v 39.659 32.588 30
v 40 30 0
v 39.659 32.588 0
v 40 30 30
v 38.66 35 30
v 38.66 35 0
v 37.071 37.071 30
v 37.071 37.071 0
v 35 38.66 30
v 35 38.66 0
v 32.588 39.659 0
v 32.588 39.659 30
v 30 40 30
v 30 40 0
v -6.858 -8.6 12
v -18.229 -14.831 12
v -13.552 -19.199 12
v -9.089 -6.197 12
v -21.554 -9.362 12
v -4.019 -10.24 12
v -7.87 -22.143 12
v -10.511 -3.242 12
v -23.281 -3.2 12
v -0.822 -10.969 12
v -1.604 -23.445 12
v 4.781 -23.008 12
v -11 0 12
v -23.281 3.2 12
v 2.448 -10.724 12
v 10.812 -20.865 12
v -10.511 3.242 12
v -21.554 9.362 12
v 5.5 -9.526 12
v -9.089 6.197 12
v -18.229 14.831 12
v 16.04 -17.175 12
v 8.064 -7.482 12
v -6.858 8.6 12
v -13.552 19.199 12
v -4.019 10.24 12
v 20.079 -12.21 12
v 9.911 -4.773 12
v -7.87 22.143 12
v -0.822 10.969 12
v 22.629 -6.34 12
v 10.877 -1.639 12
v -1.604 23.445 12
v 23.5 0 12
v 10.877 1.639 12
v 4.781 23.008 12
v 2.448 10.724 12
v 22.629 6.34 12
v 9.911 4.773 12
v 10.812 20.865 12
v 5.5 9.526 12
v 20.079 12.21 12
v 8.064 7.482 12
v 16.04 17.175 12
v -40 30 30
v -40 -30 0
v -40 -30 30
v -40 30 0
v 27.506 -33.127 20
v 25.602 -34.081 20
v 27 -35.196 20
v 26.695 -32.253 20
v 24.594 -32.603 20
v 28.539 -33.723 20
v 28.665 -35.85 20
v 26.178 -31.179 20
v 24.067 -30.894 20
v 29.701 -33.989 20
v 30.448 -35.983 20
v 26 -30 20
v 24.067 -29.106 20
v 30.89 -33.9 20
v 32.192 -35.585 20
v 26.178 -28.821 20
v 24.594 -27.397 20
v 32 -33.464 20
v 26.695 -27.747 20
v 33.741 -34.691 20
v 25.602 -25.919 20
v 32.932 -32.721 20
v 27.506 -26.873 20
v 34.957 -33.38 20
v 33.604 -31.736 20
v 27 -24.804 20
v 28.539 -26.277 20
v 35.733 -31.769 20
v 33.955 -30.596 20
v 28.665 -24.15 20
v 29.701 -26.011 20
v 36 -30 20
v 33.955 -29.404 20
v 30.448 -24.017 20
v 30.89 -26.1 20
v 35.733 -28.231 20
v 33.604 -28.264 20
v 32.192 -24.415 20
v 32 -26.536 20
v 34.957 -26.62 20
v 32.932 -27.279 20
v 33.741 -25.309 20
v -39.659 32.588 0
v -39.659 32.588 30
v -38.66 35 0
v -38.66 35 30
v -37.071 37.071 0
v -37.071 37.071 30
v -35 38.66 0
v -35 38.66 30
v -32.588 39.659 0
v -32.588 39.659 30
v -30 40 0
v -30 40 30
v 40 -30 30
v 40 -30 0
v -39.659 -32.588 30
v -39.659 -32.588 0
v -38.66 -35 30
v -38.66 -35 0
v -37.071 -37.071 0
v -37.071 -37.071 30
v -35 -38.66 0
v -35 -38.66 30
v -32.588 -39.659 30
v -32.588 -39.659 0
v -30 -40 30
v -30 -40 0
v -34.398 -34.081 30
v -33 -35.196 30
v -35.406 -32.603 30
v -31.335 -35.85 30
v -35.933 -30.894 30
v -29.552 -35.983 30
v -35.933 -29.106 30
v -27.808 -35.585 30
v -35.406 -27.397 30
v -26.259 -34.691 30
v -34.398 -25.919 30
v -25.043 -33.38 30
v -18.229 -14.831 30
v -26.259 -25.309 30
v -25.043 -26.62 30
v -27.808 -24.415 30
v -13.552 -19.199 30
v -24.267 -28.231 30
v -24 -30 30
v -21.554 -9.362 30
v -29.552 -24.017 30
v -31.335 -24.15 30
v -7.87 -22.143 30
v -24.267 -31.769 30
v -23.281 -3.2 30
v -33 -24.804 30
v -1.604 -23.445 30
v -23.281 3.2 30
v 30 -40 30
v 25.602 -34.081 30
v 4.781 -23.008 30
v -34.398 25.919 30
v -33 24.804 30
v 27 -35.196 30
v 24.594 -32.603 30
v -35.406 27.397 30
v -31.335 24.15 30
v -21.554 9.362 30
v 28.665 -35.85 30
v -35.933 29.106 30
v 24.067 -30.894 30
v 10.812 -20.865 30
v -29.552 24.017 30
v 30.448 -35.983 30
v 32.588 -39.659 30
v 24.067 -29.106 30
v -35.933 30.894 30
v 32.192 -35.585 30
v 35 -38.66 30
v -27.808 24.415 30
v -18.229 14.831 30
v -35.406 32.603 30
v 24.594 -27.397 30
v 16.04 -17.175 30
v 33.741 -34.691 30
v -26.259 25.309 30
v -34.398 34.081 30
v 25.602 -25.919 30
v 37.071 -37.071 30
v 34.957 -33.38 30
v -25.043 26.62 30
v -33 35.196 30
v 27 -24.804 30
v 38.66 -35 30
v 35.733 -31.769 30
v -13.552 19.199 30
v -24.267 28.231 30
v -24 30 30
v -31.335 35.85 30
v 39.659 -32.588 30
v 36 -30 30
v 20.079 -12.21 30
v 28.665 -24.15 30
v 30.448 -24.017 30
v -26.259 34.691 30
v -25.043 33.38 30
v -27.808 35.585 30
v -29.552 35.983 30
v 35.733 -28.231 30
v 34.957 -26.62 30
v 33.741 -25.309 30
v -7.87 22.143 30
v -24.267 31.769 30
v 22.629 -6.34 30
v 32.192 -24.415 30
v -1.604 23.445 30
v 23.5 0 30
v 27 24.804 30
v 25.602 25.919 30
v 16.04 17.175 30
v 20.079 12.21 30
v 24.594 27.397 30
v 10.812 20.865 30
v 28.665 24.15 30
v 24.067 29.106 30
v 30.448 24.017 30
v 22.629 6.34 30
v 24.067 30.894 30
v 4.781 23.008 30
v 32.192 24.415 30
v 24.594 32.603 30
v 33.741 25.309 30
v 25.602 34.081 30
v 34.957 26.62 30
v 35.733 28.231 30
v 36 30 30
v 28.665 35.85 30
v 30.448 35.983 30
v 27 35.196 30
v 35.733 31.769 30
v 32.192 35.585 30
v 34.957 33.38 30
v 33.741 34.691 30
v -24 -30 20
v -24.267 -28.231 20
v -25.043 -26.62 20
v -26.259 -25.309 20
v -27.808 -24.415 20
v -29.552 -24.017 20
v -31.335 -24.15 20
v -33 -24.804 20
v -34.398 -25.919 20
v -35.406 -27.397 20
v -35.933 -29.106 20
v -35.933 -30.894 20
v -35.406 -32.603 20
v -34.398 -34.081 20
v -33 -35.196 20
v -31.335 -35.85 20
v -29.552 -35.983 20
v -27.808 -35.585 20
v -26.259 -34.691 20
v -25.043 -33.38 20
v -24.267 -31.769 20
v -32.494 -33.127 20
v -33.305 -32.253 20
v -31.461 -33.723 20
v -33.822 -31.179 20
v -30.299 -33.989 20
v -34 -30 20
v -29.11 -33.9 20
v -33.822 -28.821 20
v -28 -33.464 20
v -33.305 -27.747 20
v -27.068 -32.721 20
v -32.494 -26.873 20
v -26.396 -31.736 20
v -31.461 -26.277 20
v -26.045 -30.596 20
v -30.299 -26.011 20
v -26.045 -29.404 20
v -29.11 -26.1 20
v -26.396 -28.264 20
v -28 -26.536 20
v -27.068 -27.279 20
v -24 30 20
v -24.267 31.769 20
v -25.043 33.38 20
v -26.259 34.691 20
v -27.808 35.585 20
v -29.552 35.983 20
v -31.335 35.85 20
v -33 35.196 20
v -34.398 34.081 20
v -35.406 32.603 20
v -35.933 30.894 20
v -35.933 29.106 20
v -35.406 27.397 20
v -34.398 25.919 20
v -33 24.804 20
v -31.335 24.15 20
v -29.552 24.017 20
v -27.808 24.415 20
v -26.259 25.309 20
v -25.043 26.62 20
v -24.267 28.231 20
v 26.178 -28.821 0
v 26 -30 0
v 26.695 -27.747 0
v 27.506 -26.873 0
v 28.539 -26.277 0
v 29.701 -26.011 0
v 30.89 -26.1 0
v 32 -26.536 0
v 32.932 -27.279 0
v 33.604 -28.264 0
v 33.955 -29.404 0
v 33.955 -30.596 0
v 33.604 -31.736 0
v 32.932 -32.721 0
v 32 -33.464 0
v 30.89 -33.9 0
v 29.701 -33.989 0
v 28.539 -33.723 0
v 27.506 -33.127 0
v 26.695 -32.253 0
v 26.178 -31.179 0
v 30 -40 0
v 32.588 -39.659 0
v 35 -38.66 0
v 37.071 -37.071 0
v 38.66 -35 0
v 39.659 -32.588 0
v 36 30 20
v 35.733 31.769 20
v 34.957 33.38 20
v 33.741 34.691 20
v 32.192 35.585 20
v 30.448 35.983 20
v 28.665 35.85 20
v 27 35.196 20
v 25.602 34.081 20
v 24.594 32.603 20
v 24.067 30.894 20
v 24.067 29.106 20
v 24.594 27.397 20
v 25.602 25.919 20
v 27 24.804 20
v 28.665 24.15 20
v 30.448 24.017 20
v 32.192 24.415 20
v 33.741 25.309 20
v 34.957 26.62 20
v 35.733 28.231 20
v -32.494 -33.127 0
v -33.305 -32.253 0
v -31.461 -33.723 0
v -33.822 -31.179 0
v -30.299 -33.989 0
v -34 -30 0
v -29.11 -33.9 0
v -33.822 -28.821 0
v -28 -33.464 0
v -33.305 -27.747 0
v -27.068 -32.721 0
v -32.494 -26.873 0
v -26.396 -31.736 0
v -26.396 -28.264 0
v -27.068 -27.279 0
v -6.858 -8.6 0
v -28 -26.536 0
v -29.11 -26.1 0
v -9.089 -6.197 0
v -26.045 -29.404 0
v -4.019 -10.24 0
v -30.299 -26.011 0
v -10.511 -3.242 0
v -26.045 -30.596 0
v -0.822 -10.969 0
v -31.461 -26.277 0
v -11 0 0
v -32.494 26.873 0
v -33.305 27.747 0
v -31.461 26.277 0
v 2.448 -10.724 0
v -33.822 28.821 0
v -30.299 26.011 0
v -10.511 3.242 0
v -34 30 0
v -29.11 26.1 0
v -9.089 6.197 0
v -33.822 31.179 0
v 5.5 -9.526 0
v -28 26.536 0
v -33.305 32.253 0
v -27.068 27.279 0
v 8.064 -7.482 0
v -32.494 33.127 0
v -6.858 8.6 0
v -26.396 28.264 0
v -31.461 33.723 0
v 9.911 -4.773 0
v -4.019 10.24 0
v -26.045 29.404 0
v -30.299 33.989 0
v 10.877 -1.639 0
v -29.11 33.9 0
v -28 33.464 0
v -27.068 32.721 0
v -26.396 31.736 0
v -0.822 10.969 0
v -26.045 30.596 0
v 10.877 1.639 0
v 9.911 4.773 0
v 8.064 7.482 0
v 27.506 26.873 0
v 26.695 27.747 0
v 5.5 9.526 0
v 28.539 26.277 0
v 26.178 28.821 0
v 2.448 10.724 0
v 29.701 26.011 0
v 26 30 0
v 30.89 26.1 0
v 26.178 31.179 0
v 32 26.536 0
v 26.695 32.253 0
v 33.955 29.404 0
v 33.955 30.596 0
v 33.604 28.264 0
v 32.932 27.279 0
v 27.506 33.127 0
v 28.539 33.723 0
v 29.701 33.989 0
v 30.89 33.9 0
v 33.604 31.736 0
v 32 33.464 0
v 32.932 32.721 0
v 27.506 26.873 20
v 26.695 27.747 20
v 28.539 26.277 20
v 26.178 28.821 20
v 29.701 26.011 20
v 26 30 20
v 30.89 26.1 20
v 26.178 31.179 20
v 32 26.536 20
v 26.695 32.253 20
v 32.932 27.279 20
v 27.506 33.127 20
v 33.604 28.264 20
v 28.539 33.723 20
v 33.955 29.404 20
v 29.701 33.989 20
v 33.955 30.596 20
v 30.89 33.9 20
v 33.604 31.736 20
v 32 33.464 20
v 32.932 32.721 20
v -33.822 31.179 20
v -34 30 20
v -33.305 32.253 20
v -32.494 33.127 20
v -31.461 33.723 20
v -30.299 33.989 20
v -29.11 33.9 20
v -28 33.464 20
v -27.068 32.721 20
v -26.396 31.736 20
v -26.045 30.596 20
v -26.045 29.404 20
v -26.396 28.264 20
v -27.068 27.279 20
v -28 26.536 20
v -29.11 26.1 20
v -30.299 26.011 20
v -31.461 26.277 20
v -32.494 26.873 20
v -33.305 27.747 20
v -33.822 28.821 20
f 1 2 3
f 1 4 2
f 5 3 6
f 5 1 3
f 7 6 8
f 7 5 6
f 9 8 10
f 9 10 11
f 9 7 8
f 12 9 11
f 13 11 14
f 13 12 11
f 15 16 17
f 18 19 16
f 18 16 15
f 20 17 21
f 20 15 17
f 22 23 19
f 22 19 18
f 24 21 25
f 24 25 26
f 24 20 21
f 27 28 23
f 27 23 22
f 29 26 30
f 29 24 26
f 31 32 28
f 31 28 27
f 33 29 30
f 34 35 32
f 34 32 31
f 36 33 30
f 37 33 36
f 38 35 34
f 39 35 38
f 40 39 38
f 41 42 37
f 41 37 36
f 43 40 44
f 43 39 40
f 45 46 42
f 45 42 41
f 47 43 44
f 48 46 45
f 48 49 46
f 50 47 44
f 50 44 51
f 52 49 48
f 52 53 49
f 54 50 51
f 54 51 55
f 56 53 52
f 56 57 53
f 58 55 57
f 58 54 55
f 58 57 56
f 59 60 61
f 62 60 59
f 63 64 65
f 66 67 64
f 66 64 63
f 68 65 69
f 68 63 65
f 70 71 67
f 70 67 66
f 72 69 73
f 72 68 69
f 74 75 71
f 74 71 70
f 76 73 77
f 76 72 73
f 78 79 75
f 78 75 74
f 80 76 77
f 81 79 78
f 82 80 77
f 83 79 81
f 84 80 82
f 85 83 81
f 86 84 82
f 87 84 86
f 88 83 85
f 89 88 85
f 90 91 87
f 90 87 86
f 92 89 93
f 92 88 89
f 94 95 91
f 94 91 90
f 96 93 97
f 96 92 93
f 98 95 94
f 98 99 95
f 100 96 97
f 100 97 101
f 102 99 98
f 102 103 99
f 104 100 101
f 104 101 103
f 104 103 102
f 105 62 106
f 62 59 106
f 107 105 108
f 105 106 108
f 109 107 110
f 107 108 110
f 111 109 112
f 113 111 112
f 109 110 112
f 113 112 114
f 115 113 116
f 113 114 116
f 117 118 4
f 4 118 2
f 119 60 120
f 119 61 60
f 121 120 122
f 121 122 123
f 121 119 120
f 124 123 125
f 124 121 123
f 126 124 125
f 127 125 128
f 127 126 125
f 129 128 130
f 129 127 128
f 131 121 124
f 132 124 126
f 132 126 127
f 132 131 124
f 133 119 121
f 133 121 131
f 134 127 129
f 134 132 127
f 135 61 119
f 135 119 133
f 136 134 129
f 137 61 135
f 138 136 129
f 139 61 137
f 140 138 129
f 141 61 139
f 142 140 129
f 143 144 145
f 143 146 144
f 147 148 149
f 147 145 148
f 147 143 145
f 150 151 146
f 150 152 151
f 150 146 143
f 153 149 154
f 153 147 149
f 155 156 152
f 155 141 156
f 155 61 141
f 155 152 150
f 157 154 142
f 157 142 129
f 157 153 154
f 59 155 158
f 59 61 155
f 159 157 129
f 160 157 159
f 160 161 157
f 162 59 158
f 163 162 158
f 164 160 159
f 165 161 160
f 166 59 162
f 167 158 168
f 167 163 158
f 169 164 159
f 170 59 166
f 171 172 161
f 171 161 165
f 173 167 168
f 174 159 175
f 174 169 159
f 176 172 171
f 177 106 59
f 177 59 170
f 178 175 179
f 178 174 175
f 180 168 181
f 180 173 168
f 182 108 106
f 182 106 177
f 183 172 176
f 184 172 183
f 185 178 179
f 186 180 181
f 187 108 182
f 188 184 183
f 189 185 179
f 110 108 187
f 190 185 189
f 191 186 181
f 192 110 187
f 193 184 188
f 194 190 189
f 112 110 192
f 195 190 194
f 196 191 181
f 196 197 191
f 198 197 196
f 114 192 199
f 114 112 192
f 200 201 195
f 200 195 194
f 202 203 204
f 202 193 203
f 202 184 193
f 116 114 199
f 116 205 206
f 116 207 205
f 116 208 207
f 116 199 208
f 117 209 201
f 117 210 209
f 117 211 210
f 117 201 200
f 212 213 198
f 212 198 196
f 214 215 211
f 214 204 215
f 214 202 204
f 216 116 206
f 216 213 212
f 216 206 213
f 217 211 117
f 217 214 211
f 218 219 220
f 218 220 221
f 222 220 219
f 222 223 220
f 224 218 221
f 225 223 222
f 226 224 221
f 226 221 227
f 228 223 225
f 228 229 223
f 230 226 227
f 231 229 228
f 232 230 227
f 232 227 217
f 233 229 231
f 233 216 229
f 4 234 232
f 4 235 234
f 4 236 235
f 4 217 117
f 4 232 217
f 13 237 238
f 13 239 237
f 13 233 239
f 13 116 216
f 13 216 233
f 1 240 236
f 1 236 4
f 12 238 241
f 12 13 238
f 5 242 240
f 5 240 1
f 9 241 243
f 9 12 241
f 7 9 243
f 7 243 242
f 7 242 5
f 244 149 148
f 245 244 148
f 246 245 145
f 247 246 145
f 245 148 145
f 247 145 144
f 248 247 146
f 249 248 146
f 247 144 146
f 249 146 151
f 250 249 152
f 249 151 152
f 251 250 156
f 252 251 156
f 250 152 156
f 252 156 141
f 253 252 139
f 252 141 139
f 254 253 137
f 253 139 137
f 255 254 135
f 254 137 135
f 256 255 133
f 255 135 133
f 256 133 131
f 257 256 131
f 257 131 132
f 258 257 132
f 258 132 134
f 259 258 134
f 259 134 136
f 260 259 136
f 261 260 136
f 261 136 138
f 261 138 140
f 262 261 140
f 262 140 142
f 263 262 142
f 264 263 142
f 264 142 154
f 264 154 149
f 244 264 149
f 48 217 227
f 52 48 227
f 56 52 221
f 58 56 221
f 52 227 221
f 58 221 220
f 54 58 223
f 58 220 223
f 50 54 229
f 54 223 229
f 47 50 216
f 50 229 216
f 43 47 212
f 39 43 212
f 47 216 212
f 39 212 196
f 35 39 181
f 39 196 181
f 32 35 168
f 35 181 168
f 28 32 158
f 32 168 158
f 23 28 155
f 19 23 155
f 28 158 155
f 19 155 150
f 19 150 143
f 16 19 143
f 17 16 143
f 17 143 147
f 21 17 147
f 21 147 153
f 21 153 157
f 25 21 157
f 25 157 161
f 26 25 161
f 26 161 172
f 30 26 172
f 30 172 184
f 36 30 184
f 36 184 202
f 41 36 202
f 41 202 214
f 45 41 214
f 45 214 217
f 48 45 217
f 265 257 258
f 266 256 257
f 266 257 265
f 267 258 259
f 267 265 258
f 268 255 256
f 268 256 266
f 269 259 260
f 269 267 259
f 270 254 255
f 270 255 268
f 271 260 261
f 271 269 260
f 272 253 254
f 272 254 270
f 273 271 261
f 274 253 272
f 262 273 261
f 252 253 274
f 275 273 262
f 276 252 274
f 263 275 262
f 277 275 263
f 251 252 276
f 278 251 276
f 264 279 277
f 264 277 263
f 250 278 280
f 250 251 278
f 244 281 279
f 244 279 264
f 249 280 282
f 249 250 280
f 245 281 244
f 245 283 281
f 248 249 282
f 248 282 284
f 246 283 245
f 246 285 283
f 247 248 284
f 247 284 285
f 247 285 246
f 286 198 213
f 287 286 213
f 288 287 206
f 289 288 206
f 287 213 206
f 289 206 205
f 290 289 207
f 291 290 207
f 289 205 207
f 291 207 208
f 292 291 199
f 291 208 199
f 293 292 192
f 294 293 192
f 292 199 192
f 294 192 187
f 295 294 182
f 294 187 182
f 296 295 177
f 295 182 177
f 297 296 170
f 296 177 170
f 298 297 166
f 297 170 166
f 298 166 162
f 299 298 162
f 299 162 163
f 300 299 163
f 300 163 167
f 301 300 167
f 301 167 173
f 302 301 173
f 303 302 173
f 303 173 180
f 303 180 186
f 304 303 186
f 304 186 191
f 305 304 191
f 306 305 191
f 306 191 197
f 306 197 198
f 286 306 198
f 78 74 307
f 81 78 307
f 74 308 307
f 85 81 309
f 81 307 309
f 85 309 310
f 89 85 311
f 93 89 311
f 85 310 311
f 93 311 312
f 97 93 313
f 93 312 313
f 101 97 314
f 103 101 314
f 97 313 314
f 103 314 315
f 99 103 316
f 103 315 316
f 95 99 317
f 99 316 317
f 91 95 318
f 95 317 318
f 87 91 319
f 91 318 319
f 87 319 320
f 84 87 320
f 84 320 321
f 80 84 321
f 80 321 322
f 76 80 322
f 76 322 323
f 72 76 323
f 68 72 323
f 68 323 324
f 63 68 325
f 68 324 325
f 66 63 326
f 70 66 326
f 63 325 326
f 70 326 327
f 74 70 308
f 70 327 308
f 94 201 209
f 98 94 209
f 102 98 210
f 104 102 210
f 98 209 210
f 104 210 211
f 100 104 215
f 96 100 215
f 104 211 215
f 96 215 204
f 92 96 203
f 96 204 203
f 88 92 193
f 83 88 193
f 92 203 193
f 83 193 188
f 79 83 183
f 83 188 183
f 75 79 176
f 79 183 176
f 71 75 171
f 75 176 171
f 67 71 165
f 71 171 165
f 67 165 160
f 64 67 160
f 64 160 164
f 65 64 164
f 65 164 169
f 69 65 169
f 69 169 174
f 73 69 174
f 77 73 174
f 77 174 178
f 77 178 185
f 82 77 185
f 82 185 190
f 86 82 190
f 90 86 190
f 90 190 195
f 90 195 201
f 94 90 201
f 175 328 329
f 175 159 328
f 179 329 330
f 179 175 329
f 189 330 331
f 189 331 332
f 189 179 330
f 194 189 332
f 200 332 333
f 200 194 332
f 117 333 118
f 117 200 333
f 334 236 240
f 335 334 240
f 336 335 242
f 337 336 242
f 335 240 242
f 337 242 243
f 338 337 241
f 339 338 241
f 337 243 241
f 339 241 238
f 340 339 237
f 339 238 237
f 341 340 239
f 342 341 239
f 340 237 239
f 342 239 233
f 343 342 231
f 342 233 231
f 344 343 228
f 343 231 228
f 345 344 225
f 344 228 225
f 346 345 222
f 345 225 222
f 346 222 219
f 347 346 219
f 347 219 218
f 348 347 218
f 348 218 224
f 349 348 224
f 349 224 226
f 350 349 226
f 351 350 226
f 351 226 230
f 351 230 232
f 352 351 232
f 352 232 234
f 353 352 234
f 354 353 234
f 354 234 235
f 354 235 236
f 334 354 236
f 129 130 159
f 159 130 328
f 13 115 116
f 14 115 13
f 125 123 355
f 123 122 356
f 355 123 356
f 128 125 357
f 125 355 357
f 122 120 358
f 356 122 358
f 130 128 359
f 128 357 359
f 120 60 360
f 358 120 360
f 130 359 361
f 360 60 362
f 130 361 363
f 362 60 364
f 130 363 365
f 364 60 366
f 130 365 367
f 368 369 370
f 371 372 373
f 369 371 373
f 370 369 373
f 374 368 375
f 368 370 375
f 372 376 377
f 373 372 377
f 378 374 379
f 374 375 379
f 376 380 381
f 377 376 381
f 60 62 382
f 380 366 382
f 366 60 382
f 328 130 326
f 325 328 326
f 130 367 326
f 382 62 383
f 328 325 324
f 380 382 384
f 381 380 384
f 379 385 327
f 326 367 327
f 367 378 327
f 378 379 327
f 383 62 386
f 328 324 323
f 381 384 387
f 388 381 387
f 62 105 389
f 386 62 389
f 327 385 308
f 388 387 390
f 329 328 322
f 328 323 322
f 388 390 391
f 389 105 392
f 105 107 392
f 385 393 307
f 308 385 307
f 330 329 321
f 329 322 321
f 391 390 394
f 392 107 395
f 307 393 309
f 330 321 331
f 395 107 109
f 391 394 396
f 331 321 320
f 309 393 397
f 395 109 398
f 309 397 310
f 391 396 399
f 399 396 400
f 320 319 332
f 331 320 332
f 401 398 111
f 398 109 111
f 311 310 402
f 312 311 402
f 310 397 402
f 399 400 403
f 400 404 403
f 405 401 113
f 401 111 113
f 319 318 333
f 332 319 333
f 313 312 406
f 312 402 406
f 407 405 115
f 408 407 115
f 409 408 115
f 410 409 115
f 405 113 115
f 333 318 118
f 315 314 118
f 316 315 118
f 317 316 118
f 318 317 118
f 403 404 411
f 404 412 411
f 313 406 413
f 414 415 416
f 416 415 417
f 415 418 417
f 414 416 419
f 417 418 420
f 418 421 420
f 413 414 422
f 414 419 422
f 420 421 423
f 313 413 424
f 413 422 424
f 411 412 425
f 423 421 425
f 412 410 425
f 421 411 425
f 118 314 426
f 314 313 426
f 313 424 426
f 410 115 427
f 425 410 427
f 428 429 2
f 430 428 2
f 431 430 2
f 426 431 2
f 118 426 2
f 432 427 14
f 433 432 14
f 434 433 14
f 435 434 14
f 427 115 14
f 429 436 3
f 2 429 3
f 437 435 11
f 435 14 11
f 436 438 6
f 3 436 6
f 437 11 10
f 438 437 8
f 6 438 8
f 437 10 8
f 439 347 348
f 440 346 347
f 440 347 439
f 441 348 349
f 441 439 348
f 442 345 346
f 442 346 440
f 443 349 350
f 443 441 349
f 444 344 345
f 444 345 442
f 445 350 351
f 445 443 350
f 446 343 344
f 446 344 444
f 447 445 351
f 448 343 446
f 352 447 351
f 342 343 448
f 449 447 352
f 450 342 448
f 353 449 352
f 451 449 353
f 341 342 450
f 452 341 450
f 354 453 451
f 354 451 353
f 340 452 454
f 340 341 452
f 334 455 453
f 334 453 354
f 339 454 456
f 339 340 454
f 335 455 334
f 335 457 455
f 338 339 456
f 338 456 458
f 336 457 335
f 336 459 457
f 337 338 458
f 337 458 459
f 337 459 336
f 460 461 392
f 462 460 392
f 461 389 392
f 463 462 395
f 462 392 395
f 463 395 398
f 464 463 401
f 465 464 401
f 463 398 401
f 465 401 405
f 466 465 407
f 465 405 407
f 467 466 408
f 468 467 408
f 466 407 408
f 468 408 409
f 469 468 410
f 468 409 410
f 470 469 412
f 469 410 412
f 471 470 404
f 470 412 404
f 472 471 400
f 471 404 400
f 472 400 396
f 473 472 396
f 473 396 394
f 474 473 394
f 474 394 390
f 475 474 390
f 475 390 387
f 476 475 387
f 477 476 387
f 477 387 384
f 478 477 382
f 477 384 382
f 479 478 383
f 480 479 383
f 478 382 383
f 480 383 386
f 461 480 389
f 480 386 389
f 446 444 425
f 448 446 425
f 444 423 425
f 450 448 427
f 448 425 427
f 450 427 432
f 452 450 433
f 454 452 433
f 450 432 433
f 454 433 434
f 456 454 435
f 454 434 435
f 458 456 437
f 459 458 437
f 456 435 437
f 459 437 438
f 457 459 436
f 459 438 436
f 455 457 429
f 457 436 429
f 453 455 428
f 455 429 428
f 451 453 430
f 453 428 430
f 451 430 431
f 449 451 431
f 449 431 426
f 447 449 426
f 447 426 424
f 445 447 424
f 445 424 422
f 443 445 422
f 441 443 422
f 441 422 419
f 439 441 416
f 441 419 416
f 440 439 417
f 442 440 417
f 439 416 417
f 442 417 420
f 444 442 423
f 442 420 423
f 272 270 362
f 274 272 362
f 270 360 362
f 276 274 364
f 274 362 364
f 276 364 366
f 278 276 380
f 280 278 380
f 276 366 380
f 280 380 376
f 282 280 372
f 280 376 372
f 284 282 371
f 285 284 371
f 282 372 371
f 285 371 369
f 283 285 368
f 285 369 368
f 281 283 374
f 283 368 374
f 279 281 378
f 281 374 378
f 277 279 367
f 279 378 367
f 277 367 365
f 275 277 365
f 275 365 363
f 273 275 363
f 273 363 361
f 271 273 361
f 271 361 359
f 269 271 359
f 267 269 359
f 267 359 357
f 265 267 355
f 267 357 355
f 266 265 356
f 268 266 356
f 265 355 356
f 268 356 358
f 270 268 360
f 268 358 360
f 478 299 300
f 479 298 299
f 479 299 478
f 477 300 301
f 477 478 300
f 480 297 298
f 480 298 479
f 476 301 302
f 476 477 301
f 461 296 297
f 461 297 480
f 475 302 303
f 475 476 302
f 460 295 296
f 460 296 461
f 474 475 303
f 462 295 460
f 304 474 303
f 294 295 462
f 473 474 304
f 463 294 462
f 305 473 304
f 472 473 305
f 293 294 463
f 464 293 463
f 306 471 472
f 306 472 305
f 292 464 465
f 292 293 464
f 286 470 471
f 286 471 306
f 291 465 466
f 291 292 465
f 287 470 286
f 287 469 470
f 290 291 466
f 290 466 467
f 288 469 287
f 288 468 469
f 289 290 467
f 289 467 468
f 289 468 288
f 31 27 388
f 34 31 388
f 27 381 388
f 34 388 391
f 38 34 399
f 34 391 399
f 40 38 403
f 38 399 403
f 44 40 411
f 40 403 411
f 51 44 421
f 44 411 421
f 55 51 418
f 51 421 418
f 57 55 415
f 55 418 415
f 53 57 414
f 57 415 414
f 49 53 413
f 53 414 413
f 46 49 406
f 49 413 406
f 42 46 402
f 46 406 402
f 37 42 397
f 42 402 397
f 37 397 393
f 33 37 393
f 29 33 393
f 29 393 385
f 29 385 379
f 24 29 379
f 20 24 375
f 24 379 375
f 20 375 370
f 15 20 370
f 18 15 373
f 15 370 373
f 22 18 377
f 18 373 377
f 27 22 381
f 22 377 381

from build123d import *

# Parameters (mm, degrees)
F0_W           = 80
F0_H           = 80
F1_DEPTH       = 30
F2_R           = 10
F4_D           = 22
F4_CBORE_D     = 47
F4_CBORE_DEPTH = 18
F6_D           = 8
F6_CBORE_D     = 12
F6_CBORE_DEPTH = 10


with BuildPart() as f1:
    # F0 (on Top) → F1 (new body)
    with BuildSketch(Plane.XY):
        Rectangle(F0_W, F0_H)
    extrude(amount=F1_DEPTH)

    # F2
    f2_edges = [f1.edges().sort_by_distance(p)[0] for p in [
        (-40, 40, 15),
        (-40, -40, 15),
        (40, -40, 15),
        (40, 40, 15),
    ]]
    fillet(f2_edges, radius=F2_R)

    # F4 (through all)
    with Locations(Plane.XY.offset(30)):
        with Locations((0, 0)):
            CounterBoreHole(F4_D / 2, F4_CBORE_D / 2, F4_CBORE_DEPTH)

    # F6 (through all)
    with Locations(Plane.XY.offset(30)):
        with Locations((-30, 30), (30, 30), (30, -30), (-30, -30)):
            CounterBoreHole(F6_D / 2, F6_CBORE_D / 2, F6_CBORE_DEPTH)


solid = f1.part
